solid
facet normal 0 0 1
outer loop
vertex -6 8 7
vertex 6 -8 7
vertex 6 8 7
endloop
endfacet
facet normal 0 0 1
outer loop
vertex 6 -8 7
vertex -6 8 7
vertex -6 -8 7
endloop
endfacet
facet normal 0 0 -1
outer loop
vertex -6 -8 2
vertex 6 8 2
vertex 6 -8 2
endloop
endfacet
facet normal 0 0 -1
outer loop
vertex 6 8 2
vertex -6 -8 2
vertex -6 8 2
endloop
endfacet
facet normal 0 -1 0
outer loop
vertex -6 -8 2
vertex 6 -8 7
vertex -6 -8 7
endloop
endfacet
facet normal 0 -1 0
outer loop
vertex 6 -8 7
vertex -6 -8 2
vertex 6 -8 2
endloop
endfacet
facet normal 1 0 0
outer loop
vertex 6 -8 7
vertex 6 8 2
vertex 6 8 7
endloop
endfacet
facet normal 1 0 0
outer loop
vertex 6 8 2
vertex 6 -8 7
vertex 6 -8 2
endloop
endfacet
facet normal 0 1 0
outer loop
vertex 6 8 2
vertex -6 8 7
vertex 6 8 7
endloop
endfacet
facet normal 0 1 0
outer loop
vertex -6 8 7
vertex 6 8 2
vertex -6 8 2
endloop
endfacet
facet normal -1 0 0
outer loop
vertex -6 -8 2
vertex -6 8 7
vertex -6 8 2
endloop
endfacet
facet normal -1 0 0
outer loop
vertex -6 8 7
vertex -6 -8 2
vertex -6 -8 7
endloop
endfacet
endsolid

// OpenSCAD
// Bulldozer Body
body_width = 12;
body_length = 16;
body_height = 5;
tread_height = 4;

// Chassis
translate([-body_width/2, -body_length/2, tread_height/2])
    cube([body_width, body_length, body_height]);
